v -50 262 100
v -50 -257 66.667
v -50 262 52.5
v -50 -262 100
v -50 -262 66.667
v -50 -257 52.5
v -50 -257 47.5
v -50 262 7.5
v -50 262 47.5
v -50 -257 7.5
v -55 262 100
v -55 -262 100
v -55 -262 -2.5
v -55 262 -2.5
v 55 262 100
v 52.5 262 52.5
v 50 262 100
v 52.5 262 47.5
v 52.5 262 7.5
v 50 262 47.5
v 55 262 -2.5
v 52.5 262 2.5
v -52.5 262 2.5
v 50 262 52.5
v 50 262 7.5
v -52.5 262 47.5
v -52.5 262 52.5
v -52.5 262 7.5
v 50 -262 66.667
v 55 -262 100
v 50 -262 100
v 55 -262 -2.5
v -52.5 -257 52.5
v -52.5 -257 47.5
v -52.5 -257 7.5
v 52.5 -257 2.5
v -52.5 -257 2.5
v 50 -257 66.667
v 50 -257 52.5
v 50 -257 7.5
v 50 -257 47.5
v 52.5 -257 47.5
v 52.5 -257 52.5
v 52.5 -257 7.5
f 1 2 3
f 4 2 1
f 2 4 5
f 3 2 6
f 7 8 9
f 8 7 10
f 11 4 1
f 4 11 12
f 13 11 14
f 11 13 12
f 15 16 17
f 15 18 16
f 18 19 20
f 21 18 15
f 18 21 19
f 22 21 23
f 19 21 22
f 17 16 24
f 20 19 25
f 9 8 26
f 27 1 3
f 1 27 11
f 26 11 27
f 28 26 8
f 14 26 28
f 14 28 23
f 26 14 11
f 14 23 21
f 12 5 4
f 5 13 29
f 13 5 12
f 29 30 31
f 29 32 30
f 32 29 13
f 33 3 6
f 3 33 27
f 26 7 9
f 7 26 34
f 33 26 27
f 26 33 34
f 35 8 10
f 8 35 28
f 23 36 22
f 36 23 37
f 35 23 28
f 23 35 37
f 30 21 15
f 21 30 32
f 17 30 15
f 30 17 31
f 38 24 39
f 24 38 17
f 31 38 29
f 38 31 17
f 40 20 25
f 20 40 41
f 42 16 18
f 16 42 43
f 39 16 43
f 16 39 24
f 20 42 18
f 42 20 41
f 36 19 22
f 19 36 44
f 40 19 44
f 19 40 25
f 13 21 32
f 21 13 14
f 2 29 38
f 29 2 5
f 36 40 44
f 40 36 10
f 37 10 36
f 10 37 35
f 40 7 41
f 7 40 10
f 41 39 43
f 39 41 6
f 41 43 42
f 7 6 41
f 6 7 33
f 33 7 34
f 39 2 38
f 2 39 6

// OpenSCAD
// Measurements
alex_drawer_wall_height = 117;
drawer_inner_depth = 524; // kind of
drawer_inner_width = 292;
folded_sock_average_height = 105;

// Constants
wall_width = 5; // thicker to allow an inset rail groove
sock_space_width = 100;
height = 100;

// Derived
front_panel_height = height * 2 / 3;
interior_width = sock_space_width - 2 * wall_width; // = 90
groove_bonus = 1; // This is used to help visualisation. Set to 0 for exact dimensions.

groove_depth = 3;

module insert_body() {
  // Bottom
  cube([sock_space_width + wall_width * 2, drawer_inner_depth, wall_width], center=true);

  // Walls
  for (sx = [-1, 1]) {
    translate([sx * (sock_space_width / 2 + wall_width / 2), 0, height / 2])
      difference() {
        cube([wall_width, drawer_inner_depth, height], center=true);

        // Elastic Band Groove
        translate([sx * ( -groove_depth / 2), 0, 0])
          cube([groove_depth, drawer_inner_depth + groove_bonus, wall_width], center=true);

        // Bottom Groove
        translate([sx * ( -groove_depth / 2), 0, -(height / 2 - wall_width)])
          cube([groove_depth, drawer_inner_depth + groove_bonus, wall_width], center=true);
      }
  }

  // Front panel
  translate([0, -(drawer_inner_depth / 2 - wall_width / 2), front_panel_height / 2])
    cube([sock_space_width + wall_width * 2, wall_width, front_panel_height], center=true);
}

// Render insert
insert_body();
